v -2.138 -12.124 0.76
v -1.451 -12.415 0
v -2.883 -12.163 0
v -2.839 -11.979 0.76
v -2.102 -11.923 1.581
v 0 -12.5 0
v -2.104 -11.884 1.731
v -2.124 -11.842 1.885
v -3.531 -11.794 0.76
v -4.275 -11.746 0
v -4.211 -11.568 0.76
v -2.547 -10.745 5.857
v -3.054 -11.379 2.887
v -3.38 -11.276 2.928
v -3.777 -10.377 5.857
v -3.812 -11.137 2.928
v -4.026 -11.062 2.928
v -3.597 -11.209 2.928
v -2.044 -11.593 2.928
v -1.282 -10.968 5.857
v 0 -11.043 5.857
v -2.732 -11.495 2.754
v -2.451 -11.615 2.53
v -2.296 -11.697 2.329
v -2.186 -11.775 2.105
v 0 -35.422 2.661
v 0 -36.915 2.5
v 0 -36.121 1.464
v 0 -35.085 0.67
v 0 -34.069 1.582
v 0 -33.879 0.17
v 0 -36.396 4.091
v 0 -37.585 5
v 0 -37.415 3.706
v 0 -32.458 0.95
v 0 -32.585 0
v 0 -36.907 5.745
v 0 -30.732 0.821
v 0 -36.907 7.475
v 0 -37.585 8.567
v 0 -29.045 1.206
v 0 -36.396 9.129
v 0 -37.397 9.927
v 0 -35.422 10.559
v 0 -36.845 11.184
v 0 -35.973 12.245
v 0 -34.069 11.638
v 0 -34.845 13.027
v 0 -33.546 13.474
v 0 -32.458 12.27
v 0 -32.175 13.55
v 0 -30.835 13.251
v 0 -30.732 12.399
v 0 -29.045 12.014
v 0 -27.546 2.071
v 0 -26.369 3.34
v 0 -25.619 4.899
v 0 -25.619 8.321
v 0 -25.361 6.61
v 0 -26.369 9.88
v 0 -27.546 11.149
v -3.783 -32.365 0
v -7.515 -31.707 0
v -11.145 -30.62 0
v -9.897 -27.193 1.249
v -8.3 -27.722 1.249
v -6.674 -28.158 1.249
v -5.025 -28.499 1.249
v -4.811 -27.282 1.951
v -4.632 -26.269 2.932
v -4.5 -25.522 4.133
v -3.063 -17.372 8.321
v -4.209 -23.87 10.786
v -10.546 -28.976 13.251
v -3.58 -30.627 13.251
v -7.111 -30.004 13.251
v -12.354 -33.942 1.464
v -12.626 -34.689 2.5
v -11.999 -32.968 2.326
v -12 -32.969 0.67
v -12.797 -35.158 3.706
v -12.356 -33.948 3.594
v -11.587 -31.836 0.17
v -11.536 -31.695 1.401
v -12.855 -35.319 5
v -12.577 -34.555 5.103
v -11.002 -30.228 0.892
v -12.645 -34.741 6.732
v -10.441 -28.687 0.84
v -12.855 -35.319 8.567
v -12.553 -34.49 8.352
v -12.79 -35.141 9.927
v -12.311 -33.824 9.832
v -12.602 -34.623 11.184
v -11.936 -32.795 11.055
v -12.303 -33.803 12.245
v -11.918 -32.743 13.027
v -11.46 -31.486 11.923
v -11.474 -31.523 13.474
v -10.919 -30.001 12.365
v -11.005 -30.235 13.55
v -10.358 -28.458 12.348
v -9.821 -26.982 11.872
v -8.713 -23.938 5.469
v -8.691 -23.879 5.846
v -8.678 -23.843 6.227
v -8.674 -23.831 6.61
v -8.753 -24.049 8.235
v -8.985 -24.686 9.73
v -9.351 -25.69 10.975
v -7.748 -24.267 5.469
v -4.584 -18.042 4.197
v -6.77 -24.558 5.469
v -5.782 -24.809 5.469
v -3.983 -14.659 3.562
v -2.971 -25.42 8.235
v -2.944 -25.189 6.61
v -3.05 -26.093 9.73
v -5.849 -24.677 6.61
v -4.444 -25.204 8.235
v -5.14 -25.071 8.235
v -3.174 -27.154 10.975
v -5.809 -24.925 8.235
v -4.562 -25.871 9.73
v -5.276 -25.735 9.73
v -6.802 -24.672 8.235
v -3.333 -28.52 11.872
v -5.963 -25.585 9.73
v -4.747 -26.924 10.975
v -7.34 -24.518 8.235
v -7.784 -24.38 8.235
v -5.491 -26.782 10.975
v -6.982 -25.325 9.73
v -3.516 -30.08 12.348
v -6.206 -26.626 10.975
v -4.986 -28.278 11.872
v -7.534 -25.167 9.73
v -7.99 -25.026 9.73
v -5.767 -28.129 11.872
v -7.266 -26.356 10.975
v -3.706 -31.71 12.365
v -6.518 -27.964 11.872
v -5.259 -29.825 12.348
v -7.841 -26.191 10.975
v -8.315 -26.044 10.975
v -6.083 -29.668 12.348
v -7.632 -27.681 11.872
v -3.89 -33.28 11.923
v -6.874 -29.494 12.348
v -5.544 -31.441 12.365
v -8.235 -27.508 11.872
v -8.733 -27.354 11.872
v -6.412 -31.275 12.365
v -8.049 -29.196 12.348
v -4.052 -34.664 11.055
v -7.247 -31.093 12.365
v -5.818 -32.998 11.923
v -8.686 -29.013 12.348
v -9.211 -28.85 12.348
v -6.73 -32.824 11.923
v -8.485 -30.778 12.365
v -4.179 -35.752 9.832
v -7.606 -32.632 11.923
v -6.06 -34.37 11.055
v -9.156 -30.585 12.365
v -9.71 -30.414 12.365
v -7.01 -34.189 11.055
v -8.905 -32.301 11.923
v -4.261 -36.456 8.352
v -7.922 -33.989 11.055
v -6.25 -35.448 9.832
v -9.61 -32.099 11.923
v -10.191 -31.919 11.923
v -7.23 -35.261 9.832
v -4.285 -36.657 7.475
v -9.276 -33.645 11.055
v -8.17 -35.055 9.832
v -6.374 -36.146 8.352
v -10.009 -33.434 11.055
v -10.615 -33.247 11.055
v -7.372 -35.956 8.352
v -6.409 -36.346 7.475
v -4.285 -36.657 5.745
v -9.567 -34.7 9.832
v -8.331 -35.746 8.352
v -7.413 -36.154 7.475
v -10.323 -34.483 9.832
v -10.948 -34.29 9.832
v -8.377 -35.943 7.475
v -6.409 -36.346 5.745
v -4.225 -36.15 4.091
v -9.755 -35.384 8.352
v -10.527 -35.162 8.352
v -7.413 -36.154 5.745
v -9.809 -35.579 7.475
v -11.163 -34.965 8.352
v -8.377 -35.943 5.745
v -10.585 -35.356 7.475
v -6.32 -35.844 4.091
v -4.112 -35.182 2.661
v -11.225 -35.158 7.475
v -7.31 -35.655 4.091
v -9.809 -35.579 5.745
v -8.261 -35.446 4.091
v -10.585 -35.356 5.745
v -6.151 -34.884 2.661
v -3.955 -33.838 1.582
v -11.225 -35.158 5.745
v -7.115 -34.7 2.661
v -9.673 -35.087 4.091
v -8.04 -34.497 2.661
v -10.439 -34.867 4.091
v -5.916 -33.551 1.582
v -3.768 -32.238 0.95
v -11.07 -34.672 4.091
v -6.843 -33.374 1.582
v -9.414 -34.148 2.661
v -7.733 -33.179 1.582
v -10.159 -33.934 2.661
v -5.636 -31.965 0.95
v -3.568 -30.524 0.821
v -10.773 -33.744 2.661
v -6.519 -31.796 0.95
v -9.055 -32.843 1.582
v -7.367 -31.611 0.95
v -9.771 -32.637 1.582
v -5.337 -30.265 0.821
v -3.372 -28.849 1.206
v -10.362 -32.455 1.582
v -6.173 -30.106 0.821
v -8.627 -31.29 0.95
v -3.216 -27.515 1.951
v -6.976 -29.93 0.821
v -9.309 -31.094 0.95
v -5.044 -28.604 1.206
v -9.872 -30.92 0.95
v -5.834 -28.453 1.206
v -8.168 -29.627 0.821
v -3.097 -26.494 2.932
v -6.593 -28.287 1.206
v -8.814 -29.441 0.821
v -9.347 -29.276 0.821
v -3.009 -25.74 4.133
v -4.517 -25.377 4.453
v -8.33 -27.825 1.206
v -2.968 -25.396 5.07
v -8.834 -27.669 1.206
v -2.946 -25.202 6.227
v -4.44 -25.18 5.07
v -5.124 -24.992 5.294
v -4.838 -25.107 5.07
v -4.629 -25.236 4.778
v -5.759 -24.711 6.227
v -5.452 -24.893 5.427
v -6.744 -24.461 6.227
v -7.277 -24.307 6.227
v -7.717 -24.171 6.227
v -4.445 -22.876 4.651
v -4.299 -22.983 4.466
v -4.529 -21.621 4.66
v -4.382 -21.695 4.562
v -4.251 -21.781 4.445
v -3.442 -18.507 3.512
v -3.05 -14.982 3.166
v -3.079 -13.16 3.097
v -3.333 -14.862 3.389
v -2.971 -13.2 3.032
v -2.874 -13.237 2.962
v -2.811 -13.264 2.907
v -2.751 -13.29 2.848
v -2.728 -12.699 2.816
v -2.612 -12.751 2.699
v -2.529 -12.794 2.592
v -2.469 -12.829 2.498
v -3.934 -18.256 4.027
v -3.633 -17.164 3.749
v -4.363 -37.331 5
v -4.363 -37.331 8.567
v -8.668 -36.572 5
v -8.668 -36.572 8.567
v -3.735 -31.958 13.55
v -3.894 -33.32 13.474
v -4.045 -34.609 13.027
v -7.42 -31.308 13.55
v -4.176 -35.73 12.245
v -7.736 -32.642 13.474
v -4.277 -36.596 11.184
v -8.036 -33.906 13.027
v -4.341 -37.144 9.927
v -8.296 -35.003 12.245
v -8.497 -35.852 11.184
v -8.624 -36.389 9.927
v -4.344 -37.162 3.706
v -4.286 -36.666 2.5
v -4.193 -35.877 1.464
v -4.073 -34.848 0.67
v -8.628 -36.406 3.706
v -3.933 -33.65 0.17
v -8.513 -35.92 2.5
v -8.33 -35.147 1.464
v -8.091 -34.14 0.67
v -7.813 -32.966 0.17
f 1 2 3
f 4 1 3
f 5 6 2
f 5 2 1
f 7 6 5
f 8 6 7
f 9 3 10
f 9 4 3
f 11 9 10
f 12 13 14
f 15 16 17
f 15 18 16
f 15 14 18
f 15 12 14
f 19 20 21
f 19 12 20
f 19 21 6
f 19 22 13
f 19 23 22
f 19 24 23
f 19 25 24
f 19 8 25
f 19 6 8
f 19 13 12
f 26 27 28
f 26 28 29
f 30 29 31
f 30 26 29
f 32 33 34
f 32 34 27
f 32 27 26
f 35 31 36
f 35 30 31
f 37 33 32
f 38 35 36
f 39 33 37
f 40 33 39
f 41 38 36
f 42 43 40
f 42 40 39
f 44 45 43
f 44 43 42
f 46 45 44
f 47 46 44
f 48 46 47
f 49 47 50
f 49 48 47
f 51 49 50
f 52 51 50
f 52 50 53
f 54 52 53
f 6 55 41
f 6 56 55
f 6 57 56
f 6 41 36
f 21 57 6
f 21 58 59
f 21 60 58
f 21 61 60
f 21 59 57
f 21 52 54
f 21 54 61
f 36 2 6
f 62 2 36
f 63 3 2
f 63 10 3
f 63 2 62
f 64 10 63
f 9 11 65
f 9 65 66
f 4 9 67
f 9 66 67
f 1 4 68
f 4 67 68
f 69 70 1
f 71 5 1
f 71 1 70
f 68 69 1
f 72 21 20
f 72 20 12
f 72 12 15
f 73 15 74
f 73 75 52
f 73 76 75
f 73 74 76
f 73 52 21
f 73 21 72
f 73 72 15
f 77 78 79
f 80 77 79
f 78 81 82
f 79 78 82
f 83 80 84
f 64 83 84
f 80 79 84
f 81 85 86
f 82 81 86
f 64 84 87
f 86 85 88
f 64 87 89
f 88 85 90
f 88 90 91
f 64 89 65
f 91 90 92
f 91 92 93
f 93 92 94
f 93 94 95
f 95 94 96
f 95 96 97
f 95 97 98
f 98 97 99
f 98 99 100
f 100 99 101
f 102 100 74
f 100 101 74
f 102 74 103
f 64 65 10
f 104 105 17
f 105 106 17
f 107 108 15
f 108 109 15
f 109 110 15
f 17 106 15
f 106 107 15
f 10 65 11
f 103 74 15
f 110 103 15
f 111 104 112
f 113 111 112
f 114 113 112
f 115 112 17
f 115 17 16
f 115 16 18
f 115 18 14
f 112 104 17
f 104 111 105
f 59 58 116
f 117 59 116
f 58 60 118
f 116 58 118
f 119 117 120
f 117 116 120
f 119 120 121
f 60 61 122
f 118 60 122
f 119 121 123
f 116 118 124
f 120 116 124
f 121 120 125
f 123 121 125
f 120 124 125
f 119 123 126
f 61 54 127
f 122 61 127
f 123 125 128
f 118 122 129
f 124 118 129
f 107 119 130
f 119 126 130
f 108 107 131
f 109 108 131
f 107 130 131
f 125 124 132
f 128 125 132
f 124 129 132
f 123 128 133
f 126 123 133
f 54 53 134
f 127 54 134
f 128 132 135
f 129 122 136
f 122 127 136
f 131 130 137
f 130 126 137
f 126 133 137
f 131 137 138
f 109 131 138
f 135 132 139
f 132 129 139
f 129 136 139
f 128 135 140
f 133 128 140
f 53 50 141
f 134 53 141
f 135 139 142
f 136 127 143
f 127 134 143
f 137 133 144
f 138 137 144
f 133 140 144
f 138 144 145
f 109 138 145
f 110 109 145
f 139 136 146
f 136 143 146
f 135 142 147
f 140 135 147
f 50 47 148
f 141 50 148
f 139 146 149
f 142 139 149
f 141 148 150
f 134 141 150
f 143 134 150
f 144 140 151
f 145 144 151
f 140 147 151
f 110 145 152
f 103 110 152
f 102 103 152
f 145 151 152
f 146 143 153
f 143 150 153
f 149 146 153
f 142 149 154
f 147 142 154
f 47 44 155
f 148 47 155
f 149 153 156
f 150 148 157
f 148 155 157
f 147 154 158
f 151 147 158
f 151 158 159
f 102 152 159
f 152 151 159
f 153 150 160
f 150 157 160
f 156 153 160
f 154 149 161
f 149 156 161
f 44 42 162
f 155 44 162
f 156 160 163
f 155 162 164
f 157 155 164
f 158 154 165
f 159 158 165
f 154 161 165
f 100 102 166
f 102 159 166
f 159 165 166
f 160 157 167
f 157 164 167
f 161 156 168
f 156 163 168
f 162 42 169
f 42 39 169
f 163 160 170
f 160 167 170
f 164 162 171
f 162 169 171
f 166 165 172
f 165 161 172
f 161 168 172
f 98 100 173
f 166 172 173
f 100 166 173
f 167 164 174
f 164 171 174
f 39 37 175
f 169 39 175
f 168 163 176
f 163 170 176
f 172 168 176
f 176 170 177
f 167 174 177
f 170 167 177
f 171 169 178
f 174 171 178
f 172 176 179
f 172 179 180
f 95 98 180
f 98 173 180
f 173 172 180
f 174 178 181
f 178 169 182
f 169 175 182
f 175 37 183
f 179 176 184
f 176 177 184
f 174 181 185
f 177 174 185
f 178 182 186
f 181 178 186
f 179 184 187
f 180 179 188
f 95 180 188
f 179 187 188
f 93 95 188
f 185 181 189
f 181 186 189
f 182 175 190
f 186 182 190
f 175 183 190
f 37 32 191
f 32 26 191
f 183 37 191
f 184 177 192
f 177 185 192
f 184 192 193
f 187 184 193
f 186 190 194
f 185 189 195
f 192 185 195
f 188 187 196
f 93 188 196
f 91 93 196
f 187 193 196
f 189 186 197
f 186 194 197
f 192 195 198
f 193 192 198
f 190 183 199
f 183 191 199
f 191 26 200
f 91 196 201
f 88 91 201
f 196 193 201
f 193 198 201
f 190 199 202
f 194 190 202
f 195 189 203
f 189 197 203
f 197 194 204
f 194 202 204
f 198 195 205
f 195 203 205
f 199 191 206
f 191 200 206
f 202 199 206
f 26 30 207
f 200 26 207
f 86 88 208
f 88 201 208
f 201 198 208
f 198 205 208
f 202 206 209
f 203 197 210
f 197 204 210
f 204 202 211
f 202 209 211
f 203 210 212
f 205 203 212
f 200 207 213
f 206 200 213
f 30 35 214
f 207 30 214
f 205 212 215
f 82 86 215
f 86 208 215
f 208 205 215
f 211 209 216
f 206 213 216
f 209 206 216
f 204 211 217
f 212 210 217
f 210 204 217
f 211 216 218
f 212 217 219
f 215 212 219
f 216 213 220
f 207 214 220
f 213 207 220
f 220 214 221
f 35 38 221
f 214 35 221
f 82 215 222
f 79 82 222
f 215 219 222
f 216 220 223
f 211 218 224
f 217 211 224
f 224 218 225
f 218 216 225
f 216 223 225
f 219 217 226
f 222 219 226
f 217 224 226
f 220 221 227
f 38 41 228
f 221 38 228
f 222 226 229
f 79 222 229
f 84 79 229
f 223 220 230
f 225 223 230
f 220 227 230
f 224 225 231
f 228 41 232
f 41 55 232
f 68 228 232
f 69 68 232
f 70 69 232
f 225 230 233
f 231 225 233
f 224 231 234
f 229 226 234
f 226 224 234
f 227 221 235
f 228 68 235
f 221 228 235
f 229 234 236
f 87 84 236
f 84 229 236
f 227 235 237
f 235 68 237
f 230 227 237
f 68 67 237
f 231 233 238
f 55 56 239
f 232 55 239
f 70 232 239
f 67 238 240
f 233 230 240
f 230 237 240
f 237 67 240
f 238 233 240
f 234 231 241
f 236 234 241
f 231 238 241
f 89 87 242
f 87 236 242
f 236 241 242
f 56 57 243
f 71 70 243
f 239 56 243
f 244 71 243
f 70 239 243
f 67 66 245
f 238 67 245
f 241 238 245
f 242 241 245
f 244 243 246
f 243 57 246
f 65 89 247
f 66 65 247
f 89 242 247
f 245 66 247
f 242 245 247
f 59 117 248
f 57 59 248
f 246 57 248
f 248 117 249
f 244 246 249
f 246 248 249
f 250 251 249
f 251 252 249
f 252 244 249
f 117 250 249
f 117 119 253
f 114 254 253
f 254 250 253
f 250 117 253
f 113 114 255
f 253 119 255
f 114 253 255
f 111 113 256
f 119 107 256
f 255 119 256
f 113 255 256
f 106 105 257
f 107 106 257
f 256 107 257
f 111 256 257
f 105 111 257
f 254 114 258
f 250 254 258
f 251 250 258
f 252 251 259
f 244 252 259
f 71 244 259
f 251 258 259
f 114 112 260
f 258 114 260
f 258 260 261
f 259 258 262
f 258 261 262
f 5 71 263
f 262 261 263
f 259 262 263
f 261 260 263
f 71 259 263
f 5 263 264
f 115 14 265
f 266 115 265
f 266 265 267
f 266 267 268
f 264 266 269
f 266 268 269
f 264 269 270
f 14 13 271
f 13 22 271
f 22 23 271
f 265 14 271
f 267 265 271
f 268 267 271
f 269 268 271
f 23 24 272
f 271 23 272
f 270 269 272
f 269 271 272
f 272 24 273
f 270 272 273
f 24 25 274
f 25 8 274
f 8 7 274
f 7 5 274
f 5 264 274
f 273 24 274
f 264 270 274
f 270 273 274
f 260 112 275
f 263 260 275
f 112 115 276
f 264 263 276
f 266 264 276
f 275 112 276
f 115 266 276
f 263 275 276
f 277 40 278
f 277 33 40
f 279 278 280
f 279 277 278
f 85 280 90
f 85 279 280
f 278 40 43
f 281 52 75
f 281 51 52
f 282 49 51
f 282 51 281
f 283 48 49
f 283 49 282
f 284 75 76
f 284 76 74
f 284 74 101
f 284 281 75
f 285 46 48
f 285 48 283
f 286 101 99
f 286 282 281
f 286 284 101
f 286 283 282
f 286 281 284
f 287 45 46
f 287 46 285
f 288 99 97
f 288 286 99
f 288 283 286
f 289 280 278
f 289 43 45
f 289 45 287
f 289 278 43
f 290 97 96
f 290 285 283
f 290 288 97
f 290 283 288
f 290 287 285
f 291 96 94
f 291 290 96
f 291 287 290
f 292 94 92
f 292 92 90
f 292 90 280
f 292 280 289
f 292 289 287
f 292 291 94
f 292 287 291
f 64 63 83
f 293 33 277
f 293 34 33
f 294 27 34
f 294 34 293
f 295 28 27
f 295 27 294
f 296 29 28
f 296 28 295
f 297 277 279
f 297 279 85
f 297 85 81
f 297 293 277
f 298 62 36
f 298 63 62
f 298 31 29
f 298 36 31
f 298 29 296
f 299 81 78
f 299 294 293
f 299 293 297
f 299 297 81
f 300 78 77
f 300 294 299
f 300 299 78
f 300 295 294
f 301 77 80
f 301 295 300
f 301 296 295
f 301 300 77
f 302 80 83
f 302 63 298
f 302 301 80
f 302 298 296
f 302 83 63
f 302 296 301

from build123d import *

# Parameters (mm, degrees)
F0_R     = 5.8053181287
F2_ANGLE = 20
F4_ANGLE = 10
F5_R     = 1.4002438662


with BuildPart() as f2:
    # F0 (on Right) → F2 (revolve)
    with BuildSketch(Plane.YZ):
        with BuildLine():
            Line((-32.5852286816, 0), (-12.5, 0))
            Line((-12.5, 0), (-11.0429839557, 5.8568340727))
            Line((-11.0429839557, 5.8568340727), (-30.835461438, 13.2508232685))
            ThreePointArc((-30.835461438, 13.2508232685), (-35.4357693129, 12.6748361661), (-37.5852286816, 8.5669878109))
            Line((-37.5852286816, 8.5669878109), (-37.5852286816, 5))
            ThreePointArc((-37.5852286816, 5), (-36.1207625875, 1.4644660941), (-32.5852286816, 0))
        make_face()
        with Locations((-31.1660505831, 6.6100014374)):
            Circle(F0_R, mode=Mode.SUBTRACT)
    revolve(axis=Axis((0, 0, 4.1237957776), (0, 0, -1)), revolution_arc=F2_ANGLE)

    # F3 (on face) → F4 (revolve, cut)
    with BuildSketch(Plane(origin=(0, 0, 0), x_dir=(-0.3420201433, -0.9396926208, 0), z_dir=(-0.9396926208, 0.3420201433, 0))):
        with BuildLine():
            Line((12.3108689231, 0.7602588451), (28.9381639648, 1.2491955472))
            ThreePointArc((28.9381639648, 1.2491955472), (26.6792086534, 2.9262576795), (25.4740637742, 5.4685091058))
            Line((25.4740637742, 5.4685091058), (11.7714919778, 2.9284170363))
            Line((11.7714919778, 2.9284170363), (12.3108689231, 0.7602588451))
        make_face()
    revolve(axis=Axis((0, 0, 4.1237957776), (0, 0, 1)), revolution_arc=F4_ANGLE, mode=Mode.SUBTRACT)

    # F5
    f5_edges = [f2.edges().sort_by_distance(p)[0] for p in [
        (-3.233811, -18.339856, 4.198463),
    ]]
    fillet(f5_edges, radius=F5_R)


solid = f2.part
